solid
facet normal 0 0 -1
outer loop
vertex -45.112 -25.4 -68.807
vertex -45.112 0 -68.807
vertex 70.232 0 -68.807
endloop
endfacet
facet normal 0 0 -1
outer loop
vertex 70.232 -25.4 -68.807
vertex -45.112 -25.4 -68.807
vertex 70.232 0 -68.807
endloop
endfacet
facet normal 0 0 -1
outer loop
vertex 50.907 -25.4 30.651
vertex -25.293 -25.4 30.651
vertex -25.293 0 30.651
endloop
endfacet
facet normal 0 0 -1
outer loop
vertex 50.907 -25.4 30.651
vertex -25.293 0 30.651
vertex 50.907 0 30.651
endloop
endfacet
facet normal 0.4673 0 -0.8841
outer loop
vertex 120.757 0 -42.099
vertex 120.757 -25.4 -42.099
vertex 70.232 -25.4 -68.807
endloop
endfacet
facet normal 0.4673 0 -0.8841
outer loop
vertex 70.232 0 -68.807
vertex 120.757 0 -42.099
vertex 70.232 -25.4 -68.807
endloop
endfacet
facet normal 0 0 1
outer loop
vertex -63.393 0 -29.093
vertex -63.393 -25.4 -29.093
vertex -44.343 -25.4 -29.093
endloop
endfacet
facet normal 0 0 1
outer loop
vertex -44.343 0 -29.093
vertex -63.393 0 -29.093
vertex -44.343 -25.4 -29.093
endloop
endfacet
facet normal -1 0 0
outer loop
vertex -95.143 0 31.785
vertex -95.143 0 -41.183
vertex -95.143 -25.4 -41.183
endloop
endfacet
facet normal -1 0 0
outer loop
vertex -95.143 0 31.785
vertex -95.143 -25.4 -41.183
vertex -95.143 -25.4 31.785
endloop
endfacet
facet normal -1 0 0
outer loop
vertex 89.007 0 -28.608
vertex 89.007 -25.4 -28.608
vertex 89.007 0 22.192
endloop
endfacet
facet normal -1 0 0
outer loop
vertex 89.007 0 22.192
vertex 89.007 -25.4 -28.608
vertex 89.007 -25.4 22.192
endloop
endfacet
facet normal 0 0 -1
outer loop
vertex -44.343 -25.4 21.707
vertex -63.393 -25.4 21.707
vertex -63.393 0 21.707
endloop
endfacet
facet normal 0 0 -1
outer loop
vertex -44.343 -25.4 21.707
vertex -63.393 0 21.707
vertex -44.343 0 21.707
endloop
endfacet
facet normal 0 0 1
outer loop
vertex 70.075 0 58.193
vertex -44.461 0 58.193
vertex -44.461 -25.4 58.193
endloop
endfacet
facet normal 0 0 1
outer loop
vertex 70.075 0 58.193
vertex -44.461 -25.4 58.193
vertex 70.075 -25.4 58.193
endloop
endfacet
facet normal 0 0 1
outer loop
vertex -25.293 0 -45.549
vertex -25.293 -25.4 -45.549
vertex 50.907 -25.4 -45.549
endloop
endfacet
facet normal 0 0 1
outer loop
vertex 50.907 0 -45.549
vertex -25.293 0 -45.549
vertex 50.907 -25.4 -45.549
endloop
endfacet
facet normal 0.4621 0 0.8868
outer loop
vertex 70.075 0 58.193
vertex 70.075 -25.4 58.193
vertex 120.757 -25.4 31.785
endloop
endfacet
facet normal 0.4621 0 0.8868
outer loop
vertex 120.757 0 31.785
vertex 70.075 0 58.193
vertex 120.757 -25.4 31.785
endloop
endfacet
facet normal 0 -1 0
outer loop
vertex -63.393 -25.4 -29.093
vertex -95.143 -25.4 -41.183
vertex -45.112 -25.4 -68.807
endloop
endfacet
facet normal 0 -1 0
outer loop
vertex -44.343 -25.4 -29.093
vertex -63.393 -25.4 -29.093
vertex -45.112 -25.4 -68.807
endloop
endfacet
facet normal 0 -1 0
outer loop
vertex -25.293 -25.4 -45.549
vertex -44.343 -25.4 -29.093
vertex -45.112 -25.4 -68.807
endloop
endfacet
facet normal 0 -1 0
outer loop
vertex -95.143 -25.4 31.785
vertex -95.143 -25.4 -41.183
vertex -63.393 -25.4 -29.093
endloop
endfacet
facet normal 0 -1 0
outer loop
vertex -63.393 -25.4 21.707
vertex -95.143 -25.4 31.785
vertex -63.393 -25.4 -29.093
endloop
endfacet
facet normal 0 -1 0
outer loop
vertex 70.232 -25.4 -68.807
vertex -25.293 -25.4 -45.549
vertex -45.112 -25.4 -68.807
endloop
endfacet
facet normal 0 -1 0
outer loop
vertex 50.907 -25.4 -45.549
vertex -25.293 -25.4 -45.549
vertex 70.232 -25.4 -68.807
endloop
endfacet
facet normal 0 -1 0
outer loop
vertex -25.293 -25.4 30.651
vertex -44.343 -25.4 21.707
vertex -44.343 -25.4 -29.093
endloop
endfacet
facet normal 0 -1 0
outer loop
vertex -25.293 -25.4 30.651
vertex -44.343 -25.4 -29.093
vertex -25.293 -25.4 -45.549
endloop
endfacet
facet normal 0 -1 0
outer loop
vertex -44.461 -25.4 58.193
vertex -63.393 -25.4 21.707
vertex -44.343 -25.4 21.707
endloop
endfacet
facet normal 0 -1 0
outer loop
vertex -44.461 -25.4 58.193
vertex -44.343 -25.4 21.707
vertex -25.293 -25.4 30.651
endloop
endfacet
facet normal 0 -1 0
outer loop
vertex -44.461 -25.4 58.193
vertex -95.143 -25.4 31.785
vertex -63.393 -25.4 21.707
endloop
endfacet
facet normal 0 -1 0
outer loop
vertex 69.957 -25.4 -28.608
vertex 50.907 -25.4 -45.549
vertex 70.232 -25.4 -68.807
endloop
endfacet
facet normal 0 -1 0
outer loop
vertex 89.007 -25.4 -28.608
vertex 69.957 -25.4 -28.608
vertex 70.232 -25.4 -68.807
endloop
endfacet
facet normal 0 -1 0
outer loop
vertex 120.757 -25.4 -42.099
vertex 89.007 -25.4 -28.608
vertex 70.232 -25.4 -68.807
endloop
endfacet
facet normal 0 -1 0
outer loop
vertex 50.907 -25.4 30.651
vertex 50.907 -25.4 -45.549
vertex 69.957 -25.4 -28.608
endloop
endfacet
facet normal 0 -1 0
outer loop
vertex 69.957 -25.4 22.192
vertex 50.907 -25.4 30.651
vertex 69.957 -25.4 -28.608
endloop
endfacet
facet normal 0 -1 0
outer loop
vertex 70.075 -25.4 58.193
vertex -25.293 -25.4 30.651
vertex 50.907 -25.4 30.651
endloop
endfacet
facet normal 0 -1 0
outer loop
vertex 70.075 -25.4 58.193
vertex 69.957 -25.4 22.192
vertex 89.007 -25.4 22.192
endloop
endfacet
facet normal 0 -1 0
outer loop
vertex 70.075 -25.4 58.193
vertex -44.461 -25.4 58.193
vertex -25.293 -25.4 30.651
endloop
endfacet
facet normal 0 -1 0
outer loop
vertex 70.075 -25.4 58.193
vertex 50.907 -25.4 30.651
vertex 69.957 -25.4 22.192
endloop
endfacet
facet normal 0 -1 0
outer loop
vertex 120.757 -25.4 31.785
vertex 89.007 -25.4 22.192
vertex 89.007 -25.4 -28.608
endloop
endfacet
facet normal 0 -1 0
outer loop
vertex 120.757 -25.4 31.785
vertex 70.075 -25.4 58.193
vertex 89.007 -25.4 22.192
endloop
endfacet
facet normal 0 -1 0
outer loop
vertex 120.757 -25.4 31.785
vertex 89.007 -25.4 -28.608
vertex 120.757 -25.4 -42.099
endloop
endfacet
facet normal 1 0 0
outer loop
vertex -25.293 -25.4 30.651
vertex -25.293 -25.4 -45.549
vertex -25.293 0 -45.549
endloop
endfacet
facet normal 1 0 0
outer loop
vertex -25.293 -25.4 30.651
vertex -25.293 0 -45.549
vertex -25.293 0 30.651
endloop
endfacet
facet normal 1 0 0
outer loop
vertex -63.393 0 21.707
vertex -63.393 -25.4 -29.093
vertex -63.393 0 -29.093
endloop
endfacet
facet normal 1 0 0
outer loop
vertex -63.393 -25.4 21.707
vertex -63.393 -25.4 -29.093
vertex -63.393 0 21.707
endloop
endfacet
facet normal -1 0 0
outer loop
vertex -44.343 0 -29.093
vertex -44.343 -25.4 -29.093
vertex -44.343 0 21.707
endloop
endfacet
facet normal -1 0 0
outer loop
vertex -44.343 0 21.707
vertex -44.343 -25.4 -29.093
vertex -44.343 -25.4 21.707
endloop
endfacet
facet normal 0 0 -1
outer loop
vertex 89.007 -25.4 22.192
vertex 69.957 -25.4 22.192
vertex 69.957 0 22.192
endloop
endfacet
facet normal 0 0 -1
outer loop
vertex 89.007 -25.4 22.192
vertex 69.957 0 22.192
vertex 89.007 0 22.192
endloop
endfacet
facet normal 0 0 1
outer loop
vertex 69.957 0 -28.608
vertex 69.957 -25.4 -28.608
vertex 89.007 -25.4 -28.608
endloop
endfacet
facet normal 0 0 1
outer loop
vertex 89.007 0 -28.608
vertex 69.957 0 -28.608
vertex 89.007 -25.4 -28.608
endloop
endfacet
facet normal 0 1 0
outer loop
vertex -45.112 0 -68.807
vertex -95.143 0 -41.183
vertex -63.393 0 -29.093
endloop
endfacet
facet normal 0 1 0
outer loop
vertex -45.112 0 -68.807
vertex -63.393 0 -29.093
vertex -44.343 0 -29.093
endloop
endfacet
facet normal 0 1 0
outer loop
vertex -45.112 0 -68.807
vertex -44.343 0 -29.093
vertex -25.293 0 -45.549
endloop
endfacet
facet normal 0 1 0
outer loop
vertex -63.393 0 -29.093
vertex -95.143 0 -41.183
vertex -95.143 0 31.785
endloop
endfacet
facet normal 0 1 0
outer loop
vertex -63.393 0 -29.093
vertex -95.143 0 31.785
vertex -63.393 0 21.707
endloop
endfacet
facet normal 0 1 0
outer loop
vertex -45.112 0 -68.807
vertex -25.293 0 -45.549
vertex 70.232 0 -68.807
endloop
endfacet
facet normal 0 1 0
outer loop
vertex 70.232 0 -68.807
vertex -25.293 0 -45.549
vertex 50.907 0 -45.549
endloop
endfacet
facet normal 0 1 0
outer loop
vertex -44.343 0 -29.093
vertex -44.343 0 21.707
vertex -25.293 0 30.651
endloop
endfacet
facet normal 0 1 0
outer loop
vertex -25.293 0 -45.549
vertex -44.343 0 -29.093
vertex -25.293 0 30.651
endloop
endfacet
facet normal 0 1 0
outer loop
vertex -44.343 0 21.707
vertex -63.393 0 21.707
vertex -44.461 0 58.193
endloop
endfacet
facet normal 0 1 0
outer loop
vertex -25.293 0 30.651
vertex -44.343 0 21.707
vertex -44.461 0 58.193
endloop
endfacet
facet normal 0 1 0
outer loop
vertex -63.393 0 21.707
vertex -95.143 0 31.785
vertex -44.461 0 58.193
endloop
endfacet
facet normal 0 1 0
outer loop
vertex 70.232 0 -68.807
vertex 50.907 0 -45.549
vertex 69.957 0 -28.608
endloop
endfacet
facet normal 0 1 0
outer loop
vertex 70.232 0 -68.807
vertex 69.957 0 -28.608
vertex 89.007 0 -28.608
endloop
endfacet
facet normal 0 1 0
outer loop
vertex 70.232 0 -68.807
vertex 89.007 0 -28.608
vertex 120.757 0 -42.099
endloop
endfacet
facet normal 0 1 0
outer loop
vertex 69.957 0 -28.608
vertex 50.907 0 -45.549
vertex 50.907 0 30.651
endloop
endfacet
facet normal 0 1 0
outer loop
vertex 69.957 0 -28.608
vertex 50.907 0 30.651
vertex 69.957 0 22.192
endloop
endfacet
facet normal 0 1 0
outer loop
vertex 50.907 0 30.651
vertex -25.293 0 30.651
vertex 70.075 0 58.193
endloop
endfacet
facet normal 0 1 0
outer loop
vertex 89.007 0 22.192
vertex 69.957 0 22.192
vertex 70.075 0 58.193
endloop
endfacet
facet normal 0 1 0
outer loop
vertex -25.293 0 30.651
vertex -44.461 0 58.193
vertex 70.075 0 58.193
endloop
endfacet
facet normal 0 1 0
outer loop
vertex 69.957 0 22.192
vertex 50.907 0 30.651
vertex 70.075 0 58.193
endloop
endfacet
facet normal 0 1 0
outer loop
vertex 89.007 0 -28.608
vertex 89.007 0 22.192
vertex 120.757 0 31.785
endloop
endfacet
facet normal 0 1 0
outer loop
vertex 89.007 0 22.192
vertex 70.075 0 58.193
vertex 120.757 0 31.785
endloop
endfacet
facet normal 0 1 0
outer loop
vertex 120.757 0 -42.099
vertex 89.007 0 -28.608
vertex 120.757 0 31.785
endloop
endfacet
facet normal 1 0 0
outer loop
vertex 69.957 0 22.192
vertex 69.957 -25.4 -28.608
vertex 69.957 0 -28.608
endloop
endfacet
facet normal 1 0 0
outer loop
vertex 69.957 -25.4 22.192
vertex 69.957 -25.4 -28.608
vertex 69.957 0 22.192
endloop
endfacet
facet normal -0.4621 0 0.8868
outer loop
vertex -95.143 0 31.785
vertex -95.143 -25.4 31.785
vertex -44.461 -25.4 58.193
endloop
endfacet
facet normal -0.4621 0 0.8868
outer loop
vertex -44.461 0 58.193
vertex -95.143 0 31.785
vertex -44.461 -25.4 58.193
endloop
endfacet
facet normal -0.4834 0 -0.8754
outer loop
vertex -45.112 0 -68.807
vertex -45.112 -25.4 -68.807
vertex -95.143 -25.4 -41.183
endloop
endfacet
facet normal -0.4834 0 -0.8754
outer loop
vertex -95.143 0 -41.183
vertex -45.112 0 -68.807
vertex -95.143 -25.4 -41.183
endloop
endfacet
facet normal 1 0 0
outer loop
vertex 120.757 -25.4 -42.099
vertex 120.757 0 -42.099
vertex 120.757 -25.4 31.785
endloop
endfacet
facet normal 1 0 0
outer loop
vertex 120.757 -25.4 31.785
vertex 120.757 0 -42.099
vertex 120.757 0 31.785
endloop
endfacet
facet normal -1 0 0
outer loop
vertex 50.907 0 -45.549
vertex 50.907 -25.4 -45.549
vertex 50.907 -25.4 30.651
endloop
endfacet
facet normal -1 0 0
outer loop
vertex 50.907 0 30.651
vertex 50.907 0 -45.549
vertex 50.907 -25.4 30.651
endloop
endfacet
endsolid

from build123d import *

# Parameters (mm, degrees)
F0_W      = 215.9
F0_H      = 127
F1_DEPTH  = 25.4
F3_DEPTH  = 25.4
F4_DEPTH  = 25.4
F5_DEPTH  = 25.4
F6_DEPTH  = 25.4
F7_W      = 76.2
F7_H      = 76.2
F8_DEPTH  = 25.4
F9_W      = 19.05
F9_H      = 50.8
F10_DEPTH = 25.4


with BuildPart() as f1:
    # F0 (on Front) → F1 (new body)
    with BuildSketch(Plane.XZ):
        with Locations((12.806937, -5.306549)):
            Rectangle(F0_W, F0_H)
    extrude(amount=F1_DEPTH)

    # F2 (on face) → F3 (cut)
    with BuildSketch(Plane.XZ.offset(25.4)):
        Polygon((-95.143063, 58.193451), (-95.143063, 31.784684), (-44.460724, 58.193451), align=None)
    extrude(amount=-F3_DEPTH, mode=Mode.SUBTRACT)

    # F2 (on face) → F4 (cut)
    with BuildSketch(Plane.XZ.offset(25.4)):
        Polygon((-45.112216, -68.806549), (-95.143063, -41.183426), (-95.143063, -68.806549), align=None)
    extrude(amount=-F4_DEPTH, mode=Mode.SUBTRACT)

    # F2 (on face) → F5 (cut)
    with BuildSketch(Plane.XZ.offset(25.4)):
        Polygon((120.756937, -42.098548), (70.231644, -68.806549), (120.756937, -68.806549), align=None)
    extrude(amount=-F5_DEPTH, mode=Mode.SUBTRACT)

    # F2 (on face) → F6 (cut)
    with BuildSketch(Plane.XZ.offset(25.4)):
        Polygon((120.756937, 58.193451), (70.074598, 58.193451), (120.756937, 31.784684), align=None)
    extrude(amount=-F6_DEPTH, mode=Mode.SUBTRACT)

    # F7 (on face) → F8 (cut)
    with BuildSketch(Plane.XZ.offset(25.4)):
        with Locations((12.806937, -7.448901)):
            Rectangle(F7_W, F7_H)
    extrude(amount=-F8_DEPTH, mode=Mode.SUBTRACT)

    # F9 (on face) → F10 (cut)
    with BuildSketch(Plane.XZ.offset(25.4)):
        with Locations((-53.868063, -3.692623)):
            Rectangle(F9_W, F9_H)
        with Locations((79.481937, -3.208301)):
            Rectangle(F9_W, F9_H)
    extrude(amount=-F10_DEPTH, mode=Mode.SUBTRACT)


solid = f1.part
